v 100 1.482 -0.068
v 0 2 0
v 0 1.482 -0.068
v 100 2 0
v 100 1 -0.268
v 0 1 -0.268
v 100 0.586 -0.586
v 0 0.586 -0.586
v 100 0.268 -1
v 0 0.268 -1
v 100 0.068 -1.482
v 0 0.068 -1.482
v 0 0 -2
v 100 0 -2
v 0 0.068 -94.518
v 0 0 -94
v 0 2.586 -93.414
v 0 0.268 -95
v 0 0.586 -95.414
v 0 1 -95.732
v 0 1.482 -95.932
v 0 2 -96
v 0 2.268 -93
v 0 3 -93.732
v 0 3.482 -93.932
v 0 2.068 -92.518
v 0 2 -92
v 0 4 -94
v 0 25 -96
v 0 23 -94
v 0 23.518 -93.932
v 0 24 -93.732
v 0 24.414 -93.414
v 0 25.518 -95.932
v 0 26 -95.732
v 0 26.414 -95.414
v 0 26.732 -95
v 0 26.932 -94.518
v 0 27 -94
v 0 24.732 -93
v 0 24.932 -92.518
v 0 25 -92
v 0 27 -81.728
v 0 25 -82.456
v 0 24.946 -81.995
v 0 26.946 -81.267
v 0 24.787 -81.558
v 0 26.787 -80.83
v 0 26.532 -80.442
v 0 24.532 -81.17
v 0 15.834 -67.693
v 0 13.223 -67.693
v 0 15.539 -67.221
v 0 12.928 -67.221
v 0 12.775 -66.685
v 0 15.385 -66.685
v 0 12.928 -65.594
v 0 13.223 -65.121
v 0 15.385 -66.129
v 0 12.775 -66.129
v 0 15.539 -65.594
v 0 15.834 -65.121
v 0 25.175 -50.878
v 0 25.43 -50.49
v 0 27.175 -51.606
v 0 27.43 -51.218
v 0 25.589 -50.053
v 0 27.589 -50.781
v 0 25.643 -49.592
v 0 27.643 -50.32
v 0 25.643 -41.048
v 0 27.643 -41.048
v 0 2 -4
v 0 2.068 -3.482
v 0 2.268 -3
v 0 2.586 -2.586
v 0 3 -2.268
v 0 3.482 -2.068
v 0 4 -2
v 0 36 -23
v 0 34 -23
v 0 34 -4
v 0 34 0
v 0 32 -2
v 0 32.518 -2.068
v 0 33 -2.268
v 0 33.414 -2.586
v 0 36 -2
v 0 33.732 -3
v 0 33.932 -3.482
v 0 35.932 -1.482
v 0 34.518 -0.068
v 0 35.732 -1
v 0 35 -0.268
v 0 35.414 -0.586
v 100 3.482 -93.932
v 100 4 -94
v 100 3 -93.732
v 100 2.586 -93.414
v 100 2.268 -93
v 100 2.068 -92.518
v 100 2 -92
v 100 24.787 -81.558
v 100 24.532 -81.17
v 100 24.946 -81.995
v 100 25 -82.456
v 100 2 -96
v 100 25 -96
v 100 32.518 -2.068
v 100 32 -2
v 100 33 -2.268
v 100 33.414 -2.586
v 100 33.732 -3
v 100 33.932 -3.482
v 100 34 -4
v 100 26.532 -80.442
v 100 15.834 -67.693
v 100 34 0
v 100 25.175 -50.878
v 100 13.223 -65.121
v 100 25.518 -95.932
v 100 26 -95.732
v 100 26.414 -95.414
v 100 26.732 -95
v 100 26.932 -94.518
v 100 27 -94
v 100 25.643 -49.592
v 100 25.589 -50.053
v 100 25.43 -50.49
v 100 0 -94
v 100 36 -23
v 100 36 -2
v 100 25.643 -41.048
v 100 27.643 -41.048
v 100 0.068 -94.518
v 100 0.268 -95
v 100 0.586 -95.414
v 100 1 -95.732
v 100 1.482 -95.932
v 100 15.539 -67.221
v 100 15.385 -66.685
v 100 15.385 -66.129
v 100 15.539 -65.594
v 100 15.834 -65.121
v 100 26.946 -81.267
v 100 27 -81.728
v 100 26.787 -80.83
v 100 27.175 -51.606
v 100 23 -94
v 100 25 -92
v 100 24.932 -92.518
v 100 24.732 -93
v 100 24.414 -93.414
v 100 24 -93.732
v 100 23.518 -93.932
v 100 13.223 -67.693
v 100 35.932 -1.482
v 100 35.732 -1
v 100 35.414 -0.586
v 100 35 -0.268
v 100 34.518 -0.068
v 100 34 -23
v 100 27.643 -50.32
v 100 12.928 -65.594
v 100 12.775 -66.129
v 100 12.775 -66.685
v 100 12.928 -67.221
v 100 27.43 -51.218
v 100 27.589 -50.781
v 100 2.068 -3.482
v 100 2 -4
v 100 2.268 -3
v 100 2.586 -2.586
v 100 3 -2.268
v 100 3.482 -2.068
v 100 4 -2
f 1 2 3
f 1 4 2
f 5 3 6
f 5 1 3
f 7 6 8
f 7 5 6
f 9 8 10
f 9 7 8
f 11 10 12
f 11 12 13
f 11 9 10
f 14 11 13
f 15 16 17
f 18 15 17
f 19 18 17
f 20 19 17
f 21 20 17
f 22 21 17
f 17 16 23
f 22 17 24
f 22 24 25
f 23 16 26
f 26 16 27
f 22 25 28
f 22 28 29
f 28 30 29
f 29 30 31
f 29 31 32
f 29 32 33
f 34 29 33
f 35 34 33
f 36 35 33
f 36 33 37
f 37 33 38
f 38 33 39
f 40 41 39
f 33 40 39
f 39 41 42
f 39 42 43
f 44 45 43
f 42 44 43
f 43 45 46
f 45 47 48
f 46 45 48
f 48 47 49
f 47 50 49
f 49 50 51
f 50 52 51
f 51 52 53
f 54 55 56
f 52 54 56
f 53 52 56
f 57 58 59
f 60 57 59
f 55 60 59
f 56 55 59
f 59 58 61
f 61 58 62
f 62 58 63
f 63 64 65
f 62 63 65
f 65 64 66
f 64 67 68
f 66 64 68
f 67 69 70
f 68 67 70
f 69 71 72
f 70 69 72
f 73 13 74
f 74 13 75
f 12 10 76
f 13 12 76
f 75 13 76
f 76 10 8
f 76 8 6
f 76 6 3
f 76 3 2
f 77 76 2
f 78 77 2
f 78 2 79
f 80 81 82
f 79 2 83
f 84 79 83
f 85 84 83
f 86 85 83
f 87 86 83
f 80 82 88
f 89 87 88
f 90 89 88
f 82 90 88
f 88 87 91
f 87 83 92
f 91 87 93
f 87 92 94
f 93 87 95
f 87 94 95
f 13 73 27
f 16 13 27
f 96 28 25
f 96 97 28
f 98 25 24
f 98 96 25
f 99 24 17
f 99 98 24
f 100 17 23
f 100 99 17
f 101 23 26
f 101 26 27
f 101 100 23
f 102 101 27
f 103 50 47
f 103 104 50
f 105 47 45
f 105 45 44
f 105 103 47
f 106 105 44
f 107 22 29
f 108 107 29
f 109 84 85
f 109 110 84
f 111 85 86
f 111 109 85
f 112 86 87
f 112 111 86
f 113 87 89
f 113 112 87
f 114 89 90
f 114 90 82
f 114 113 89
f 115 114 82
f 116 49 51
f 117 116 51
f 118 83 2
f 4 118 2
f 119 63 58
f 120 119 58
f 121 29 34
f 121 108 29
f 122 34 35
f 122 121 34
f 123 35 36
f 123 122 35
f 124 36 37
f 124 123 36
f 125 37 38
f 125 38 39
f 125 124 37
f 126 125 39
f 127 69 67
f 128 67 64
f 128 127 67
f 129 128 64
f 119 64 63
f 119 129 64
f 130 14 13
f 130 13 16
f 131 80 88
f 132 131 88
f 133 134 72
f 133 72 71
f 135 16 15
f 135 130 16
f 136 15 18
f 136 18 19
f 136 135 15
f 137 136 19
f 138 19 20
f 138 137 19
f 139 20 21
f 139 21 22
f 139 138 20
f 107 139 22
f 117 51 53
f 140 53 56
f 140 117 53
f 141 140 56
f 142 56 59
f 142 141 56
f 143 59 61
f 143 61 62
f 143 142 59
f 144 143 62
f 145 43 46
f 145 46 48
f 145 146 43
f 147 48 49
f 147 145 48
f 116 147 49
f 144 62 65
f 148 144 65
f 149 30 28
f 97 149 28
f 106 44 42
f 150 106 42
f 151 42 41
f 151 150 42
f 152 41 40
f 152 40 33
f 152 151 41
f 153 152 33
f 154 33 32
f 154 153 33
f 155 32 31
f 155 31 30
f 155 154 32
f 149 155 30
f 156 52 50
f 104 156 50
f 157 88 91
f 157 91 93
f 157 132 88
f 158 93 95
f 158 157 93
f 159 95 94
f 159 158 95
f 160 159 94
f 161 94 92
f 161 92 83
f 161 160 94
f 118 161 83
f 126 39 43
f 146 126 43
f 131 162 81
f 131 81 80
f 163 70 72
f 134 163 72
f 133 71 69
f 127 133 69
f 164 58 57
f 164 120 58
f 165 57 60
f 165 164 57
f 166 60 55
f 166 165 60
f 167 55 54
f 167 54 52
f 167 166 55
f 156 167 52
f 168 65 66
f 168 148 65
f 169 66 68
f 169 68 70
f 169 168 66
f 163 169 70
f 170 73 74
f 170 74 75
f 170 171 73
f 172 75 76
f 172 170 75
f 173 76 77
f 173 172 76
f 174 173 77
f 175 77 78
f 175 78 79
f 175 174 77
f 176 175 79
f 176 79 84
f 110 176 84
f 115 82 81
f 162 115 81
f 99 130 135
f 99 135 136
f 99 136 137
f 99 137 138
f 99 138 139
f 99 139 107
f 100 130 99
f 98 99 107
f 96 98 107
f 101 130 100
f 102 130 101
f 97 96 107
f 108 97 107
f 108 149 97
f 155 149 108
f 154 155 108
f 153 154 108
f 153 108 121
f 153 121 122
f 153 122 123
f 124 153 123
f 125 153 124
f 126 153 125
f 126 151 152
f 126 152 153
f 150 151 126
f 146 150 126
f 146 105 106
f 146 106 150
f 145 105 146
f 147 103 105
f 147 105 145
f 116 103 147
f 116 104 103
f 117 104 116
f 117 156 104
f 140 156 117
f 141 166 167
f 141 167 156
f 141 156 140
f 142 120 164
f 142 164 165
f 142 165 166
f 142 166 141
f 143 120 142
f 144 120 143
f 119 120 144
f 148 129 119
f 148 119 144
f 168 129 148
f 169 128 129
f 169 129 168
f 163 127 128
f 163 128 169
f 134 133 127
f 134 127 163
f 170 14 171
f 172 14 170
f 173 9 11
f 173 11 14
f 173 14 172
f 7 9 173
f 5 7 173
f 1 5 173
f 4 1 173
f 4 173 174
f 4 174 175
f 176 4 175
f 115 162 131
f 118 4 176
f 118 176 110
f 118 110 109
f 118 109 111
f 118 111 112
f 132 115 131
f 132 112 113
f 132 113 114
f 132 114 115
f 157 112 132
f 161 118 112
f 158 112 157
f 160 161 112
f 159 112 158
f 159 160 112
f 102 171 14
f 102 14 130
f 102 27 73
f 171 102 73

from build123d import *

# Parameters (mm, degrees)
F1_DEPTH = 100
F2_R     = 2


with BuildPart() as f1:
    # F0 (on Right) → F1 (new body)
    with BuildSketch(Plane.YZ):
        Polygon((34, -23), (36, -23), (36, 0), (0, 0), (0, -96), (27, -96), (27, -81), (14.755062, -66.407052), (27.642788, -51.048059), (27.642788, -41.048059), (25.642788, -41.048059), (25.642788, -50.320118), (12.144248, -66.407052), (25, -81.72794), (25, -94), (2, -94), (2, -2), (34, -2), align=None)
    extrude(amount=F1_DEPTH)

    # F2
    f2_edges = [f1.edges().sort_by_distance(p)[0] for p in [
        (50, 36, 0),
        (50, 0, 0),
        (50, 34, -2),
        (50, 2, -2),
        (50, 0, -96),
        (50, 27, -96),
        (50, 27, -81),
        (50, 14.755062, -66.407052),
        (50, 27.642788, -51.048059),
        (50, 2, -94),
        (50, 25, -94),
        (50, 25, -81.72794),
        (50, 12.144248, -66.407052),
        (50, 25.642788, -50.320118),
    ]]
    fillet(f2_edges, radius=F2_R)


solid = f1.part
